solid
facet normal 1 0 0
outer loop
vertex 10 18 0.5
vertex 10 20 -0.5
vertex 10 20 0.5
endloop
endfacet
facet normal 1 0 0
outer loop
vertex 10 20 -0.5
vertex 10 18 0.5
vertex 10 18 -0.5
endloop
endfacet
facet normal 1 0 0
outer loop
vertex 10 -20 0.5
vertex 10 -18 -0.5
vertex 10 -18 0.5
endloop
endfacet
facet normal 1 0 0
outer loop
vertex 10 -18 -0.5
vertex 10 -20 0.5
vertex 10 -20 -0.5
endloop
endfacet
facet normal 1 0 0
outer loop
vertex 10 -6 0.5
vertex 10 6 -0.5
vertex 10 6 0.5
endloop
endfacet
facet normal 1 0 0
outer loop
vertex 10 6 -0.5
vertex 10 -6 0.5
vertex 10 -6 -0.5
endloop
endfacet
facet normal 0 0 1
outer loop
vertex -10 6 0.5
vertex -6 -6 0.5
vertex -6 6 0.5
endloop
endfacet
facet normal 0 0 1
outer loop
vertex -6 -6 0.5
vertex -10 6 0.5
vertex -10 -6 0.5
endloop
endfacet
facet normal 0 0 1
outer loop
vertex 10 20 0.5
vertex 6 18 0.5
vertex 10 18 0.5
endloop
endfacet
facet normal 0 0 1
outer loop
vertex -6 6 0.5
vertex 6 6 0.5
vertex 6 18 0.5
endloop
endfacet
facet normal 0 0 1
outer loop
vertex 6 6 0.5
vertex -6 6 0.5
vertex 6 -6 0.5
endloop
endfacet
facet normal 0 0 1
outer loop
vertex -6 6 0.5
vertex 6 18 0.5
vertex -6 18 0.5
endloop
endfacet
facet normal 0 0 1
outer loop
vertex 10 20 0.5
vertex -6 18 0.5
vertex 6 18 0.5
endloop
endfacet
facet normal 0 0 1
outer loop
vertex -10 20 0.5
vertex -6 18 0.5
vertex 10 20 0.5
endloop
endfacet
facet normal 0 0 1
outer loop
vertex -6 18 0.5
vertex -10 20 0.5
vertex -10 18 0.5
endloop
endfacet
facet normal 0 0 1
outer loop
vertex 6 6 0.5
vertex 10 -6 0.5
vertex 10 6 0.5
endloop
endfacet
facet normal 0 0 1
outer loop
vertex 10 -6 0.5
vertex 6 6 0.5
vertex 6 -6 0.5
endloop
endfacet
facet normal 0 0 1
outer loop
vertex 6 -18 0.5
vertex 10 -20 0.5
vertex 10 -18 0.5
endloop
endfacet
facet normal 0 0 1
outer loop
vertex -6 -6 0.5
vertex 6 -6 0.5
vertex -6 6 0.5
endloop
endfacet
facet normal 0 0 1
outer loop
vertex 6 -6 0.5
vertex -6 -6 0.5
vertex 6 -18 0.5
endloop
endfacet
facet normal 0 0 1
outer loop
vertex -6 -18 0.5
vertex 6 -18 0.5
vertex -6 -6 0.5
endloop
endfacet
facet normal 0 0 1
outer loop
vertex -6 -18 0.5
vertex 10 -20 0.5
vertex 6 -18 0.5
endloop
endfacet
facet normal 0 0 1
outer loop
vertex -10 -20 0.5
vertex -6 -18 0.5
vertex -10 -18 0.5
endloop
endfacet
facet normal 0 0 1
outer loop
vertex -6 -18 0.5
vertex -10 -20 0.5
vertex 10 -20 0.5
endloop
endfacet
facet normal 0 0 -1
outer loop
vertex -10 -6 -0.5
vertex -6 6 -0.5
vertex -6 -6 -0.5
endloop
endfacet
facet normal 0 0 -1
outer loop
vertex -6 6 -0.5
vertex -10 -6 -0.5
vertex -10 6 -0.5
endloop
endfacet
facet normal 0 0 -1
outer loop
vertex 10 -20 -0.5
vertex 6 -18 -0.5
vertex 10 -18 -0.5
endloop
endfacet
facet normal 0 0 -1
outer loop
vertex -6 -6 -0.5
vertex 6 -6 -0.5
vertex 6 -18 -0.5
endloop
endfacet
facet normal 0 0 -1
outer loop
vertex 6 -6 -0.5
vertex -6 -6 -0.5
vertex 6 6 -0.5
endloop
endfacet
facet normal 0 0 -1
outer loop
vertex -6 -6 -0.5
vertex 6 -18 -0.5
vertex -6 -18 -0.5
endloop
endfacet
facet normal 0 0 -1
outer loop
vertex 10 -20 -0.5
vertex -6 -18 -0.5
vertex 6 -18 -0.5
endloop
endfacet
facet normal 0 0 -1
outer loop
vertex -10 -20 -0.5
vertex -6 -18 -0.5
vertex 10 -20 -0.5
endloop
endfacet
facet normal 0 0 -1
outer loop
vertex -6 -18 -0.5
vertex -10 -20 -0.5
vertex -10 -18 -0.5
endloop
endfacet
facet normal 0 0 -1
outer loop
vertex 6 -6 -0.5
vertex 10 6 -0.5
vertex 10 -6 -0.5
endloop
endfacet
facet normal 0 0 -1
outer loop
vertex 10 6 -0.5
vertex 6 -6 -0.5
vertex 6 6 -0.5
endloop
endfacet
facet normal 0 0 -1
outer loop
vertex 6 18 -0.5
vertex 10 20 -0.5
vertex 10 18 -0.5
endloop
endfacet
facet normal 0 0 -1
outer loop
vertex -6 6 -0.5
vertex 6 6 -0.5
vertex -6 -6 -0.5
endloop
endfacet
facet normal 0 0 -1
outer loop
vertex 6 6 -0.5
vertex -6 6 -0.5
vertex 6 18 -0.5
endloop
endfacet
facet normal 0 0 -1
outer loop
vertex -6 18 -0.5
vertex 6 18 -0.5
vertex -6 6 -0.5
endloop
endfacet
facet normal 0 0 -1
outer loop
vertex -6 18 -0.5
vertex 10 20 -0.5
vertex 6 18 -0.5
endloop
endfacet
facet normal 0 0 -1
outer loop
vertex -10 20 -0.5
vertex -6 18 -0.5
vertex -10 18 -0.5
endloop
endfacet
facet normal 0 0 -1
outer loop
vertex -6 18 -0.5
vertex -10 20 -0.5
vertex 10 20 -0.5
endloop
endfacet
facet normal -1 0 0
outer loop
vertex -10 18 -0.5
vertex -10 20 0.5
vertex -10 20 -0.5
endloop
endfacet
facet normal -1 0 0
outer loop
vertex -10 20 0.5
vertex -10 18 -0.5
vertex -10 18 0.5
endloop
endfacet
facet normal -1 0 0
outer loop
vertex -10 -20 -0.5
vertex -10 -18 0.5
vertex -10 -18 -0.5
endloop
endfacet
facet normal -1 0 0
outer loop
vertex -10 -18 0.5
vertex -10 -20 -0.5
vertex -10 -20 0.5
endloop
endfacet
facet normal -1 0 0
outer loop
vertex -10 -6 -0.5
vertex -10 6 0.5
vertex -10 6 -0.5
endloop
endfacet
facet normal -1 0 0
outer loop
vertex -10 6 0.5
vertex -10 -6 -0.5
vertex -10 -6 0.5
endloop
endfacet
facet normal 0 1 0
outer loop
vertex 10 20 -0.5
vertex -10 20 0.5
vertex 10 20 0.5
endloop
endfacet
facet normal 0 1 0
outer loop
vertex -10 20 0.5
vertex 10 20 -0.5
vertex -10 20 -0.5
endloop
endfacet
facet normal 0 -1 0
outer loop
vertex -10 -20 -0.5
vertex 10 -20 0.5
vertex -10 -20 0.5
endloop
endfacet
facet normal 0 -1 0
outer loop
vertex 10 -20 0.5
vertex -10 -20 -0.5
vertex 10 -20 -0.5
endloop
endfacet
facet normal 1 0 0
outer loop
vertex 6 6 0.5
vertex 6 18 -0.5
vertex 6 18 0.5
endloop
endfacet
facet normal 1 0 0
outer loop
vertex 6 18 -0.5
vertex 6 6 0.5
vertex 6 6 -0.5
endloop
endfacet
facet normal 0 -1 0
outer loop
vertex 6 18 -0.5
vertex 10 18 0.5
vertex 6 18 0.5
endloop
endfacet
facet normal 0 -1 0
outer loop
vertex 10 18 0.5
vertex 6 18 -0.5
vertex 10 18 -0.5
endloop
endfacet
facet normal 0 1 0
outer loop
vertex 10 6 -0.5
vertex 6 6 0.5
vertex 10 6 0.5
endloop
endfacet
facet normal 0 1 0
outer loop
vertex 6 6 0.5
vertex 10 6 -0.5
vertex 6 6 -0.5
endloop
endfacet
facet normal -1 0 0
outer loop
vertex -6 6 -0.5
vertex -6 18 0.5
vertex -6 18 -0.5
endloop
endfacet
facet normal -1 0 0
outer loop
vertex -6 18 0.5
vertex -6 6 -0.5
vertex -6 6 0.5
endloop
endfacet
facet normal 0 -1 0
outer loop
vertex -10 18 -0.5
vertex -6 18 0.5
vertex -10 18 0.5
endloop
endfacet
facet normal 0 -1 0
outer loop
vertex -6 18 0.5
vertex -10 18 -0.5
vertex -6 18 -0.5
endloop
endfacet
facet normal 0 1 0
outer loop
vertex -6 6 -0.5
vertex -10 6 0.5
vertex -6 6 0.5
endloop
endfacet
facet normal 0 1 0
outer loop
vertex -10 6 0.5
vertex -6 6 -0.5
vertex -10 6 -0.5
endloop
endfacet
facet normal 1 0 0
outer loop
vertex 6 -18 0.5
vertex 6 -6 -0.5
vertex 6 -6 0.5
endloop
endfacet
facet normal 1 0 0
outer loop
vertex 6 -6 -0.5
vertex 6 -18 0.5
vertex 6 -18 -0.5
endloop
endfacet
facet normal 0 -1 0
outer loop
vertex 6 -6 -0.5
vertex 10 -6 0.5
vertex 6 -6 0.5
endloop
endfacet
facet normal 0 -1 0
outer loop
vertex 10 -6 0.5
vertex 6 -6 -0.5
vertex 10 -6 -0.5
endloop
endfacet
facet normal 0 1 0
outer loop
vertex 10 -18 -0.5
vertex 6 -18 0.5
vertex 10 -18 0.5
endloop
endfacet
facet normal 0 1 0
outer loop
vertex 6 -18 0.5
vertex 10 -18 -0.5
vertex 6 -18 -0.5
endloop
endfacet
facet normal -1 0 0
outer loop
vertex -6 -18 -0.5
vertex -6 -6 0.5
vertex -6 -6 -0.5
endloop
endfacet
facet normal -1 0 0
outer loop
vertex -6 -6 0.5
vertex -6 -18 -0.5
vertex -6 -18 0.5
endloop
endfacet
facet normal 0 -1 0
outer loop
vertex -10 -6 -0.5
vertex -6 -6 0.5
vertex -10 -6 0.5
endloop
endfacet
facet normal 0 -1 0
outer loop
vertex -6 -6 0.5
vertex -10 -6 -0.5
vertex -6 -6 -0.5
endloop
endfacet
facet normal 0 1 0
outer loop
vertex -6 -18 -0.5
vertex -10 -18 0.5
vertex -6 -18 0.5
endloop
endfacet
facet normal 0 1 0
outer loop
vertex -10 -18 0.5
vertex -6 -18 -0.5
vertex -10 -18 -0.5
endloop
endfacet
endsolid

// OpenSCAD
module frame(width=20,height=40){
    difference(){
    
    cube([width,height,1],true);
    //左前
    translate([6,6,-1.5])
        cube([6,12,4]);
    //右前
    translate([-12,6,-1.5])
        cube([6,12,4]);

    //左后 
    translate([6,-18,-1.5])
        cube([6,12,4]);
    //右后
    translate([-12,-18,-1.5])
        cube([6,12,4]);
    }
}
frame(20,40);
